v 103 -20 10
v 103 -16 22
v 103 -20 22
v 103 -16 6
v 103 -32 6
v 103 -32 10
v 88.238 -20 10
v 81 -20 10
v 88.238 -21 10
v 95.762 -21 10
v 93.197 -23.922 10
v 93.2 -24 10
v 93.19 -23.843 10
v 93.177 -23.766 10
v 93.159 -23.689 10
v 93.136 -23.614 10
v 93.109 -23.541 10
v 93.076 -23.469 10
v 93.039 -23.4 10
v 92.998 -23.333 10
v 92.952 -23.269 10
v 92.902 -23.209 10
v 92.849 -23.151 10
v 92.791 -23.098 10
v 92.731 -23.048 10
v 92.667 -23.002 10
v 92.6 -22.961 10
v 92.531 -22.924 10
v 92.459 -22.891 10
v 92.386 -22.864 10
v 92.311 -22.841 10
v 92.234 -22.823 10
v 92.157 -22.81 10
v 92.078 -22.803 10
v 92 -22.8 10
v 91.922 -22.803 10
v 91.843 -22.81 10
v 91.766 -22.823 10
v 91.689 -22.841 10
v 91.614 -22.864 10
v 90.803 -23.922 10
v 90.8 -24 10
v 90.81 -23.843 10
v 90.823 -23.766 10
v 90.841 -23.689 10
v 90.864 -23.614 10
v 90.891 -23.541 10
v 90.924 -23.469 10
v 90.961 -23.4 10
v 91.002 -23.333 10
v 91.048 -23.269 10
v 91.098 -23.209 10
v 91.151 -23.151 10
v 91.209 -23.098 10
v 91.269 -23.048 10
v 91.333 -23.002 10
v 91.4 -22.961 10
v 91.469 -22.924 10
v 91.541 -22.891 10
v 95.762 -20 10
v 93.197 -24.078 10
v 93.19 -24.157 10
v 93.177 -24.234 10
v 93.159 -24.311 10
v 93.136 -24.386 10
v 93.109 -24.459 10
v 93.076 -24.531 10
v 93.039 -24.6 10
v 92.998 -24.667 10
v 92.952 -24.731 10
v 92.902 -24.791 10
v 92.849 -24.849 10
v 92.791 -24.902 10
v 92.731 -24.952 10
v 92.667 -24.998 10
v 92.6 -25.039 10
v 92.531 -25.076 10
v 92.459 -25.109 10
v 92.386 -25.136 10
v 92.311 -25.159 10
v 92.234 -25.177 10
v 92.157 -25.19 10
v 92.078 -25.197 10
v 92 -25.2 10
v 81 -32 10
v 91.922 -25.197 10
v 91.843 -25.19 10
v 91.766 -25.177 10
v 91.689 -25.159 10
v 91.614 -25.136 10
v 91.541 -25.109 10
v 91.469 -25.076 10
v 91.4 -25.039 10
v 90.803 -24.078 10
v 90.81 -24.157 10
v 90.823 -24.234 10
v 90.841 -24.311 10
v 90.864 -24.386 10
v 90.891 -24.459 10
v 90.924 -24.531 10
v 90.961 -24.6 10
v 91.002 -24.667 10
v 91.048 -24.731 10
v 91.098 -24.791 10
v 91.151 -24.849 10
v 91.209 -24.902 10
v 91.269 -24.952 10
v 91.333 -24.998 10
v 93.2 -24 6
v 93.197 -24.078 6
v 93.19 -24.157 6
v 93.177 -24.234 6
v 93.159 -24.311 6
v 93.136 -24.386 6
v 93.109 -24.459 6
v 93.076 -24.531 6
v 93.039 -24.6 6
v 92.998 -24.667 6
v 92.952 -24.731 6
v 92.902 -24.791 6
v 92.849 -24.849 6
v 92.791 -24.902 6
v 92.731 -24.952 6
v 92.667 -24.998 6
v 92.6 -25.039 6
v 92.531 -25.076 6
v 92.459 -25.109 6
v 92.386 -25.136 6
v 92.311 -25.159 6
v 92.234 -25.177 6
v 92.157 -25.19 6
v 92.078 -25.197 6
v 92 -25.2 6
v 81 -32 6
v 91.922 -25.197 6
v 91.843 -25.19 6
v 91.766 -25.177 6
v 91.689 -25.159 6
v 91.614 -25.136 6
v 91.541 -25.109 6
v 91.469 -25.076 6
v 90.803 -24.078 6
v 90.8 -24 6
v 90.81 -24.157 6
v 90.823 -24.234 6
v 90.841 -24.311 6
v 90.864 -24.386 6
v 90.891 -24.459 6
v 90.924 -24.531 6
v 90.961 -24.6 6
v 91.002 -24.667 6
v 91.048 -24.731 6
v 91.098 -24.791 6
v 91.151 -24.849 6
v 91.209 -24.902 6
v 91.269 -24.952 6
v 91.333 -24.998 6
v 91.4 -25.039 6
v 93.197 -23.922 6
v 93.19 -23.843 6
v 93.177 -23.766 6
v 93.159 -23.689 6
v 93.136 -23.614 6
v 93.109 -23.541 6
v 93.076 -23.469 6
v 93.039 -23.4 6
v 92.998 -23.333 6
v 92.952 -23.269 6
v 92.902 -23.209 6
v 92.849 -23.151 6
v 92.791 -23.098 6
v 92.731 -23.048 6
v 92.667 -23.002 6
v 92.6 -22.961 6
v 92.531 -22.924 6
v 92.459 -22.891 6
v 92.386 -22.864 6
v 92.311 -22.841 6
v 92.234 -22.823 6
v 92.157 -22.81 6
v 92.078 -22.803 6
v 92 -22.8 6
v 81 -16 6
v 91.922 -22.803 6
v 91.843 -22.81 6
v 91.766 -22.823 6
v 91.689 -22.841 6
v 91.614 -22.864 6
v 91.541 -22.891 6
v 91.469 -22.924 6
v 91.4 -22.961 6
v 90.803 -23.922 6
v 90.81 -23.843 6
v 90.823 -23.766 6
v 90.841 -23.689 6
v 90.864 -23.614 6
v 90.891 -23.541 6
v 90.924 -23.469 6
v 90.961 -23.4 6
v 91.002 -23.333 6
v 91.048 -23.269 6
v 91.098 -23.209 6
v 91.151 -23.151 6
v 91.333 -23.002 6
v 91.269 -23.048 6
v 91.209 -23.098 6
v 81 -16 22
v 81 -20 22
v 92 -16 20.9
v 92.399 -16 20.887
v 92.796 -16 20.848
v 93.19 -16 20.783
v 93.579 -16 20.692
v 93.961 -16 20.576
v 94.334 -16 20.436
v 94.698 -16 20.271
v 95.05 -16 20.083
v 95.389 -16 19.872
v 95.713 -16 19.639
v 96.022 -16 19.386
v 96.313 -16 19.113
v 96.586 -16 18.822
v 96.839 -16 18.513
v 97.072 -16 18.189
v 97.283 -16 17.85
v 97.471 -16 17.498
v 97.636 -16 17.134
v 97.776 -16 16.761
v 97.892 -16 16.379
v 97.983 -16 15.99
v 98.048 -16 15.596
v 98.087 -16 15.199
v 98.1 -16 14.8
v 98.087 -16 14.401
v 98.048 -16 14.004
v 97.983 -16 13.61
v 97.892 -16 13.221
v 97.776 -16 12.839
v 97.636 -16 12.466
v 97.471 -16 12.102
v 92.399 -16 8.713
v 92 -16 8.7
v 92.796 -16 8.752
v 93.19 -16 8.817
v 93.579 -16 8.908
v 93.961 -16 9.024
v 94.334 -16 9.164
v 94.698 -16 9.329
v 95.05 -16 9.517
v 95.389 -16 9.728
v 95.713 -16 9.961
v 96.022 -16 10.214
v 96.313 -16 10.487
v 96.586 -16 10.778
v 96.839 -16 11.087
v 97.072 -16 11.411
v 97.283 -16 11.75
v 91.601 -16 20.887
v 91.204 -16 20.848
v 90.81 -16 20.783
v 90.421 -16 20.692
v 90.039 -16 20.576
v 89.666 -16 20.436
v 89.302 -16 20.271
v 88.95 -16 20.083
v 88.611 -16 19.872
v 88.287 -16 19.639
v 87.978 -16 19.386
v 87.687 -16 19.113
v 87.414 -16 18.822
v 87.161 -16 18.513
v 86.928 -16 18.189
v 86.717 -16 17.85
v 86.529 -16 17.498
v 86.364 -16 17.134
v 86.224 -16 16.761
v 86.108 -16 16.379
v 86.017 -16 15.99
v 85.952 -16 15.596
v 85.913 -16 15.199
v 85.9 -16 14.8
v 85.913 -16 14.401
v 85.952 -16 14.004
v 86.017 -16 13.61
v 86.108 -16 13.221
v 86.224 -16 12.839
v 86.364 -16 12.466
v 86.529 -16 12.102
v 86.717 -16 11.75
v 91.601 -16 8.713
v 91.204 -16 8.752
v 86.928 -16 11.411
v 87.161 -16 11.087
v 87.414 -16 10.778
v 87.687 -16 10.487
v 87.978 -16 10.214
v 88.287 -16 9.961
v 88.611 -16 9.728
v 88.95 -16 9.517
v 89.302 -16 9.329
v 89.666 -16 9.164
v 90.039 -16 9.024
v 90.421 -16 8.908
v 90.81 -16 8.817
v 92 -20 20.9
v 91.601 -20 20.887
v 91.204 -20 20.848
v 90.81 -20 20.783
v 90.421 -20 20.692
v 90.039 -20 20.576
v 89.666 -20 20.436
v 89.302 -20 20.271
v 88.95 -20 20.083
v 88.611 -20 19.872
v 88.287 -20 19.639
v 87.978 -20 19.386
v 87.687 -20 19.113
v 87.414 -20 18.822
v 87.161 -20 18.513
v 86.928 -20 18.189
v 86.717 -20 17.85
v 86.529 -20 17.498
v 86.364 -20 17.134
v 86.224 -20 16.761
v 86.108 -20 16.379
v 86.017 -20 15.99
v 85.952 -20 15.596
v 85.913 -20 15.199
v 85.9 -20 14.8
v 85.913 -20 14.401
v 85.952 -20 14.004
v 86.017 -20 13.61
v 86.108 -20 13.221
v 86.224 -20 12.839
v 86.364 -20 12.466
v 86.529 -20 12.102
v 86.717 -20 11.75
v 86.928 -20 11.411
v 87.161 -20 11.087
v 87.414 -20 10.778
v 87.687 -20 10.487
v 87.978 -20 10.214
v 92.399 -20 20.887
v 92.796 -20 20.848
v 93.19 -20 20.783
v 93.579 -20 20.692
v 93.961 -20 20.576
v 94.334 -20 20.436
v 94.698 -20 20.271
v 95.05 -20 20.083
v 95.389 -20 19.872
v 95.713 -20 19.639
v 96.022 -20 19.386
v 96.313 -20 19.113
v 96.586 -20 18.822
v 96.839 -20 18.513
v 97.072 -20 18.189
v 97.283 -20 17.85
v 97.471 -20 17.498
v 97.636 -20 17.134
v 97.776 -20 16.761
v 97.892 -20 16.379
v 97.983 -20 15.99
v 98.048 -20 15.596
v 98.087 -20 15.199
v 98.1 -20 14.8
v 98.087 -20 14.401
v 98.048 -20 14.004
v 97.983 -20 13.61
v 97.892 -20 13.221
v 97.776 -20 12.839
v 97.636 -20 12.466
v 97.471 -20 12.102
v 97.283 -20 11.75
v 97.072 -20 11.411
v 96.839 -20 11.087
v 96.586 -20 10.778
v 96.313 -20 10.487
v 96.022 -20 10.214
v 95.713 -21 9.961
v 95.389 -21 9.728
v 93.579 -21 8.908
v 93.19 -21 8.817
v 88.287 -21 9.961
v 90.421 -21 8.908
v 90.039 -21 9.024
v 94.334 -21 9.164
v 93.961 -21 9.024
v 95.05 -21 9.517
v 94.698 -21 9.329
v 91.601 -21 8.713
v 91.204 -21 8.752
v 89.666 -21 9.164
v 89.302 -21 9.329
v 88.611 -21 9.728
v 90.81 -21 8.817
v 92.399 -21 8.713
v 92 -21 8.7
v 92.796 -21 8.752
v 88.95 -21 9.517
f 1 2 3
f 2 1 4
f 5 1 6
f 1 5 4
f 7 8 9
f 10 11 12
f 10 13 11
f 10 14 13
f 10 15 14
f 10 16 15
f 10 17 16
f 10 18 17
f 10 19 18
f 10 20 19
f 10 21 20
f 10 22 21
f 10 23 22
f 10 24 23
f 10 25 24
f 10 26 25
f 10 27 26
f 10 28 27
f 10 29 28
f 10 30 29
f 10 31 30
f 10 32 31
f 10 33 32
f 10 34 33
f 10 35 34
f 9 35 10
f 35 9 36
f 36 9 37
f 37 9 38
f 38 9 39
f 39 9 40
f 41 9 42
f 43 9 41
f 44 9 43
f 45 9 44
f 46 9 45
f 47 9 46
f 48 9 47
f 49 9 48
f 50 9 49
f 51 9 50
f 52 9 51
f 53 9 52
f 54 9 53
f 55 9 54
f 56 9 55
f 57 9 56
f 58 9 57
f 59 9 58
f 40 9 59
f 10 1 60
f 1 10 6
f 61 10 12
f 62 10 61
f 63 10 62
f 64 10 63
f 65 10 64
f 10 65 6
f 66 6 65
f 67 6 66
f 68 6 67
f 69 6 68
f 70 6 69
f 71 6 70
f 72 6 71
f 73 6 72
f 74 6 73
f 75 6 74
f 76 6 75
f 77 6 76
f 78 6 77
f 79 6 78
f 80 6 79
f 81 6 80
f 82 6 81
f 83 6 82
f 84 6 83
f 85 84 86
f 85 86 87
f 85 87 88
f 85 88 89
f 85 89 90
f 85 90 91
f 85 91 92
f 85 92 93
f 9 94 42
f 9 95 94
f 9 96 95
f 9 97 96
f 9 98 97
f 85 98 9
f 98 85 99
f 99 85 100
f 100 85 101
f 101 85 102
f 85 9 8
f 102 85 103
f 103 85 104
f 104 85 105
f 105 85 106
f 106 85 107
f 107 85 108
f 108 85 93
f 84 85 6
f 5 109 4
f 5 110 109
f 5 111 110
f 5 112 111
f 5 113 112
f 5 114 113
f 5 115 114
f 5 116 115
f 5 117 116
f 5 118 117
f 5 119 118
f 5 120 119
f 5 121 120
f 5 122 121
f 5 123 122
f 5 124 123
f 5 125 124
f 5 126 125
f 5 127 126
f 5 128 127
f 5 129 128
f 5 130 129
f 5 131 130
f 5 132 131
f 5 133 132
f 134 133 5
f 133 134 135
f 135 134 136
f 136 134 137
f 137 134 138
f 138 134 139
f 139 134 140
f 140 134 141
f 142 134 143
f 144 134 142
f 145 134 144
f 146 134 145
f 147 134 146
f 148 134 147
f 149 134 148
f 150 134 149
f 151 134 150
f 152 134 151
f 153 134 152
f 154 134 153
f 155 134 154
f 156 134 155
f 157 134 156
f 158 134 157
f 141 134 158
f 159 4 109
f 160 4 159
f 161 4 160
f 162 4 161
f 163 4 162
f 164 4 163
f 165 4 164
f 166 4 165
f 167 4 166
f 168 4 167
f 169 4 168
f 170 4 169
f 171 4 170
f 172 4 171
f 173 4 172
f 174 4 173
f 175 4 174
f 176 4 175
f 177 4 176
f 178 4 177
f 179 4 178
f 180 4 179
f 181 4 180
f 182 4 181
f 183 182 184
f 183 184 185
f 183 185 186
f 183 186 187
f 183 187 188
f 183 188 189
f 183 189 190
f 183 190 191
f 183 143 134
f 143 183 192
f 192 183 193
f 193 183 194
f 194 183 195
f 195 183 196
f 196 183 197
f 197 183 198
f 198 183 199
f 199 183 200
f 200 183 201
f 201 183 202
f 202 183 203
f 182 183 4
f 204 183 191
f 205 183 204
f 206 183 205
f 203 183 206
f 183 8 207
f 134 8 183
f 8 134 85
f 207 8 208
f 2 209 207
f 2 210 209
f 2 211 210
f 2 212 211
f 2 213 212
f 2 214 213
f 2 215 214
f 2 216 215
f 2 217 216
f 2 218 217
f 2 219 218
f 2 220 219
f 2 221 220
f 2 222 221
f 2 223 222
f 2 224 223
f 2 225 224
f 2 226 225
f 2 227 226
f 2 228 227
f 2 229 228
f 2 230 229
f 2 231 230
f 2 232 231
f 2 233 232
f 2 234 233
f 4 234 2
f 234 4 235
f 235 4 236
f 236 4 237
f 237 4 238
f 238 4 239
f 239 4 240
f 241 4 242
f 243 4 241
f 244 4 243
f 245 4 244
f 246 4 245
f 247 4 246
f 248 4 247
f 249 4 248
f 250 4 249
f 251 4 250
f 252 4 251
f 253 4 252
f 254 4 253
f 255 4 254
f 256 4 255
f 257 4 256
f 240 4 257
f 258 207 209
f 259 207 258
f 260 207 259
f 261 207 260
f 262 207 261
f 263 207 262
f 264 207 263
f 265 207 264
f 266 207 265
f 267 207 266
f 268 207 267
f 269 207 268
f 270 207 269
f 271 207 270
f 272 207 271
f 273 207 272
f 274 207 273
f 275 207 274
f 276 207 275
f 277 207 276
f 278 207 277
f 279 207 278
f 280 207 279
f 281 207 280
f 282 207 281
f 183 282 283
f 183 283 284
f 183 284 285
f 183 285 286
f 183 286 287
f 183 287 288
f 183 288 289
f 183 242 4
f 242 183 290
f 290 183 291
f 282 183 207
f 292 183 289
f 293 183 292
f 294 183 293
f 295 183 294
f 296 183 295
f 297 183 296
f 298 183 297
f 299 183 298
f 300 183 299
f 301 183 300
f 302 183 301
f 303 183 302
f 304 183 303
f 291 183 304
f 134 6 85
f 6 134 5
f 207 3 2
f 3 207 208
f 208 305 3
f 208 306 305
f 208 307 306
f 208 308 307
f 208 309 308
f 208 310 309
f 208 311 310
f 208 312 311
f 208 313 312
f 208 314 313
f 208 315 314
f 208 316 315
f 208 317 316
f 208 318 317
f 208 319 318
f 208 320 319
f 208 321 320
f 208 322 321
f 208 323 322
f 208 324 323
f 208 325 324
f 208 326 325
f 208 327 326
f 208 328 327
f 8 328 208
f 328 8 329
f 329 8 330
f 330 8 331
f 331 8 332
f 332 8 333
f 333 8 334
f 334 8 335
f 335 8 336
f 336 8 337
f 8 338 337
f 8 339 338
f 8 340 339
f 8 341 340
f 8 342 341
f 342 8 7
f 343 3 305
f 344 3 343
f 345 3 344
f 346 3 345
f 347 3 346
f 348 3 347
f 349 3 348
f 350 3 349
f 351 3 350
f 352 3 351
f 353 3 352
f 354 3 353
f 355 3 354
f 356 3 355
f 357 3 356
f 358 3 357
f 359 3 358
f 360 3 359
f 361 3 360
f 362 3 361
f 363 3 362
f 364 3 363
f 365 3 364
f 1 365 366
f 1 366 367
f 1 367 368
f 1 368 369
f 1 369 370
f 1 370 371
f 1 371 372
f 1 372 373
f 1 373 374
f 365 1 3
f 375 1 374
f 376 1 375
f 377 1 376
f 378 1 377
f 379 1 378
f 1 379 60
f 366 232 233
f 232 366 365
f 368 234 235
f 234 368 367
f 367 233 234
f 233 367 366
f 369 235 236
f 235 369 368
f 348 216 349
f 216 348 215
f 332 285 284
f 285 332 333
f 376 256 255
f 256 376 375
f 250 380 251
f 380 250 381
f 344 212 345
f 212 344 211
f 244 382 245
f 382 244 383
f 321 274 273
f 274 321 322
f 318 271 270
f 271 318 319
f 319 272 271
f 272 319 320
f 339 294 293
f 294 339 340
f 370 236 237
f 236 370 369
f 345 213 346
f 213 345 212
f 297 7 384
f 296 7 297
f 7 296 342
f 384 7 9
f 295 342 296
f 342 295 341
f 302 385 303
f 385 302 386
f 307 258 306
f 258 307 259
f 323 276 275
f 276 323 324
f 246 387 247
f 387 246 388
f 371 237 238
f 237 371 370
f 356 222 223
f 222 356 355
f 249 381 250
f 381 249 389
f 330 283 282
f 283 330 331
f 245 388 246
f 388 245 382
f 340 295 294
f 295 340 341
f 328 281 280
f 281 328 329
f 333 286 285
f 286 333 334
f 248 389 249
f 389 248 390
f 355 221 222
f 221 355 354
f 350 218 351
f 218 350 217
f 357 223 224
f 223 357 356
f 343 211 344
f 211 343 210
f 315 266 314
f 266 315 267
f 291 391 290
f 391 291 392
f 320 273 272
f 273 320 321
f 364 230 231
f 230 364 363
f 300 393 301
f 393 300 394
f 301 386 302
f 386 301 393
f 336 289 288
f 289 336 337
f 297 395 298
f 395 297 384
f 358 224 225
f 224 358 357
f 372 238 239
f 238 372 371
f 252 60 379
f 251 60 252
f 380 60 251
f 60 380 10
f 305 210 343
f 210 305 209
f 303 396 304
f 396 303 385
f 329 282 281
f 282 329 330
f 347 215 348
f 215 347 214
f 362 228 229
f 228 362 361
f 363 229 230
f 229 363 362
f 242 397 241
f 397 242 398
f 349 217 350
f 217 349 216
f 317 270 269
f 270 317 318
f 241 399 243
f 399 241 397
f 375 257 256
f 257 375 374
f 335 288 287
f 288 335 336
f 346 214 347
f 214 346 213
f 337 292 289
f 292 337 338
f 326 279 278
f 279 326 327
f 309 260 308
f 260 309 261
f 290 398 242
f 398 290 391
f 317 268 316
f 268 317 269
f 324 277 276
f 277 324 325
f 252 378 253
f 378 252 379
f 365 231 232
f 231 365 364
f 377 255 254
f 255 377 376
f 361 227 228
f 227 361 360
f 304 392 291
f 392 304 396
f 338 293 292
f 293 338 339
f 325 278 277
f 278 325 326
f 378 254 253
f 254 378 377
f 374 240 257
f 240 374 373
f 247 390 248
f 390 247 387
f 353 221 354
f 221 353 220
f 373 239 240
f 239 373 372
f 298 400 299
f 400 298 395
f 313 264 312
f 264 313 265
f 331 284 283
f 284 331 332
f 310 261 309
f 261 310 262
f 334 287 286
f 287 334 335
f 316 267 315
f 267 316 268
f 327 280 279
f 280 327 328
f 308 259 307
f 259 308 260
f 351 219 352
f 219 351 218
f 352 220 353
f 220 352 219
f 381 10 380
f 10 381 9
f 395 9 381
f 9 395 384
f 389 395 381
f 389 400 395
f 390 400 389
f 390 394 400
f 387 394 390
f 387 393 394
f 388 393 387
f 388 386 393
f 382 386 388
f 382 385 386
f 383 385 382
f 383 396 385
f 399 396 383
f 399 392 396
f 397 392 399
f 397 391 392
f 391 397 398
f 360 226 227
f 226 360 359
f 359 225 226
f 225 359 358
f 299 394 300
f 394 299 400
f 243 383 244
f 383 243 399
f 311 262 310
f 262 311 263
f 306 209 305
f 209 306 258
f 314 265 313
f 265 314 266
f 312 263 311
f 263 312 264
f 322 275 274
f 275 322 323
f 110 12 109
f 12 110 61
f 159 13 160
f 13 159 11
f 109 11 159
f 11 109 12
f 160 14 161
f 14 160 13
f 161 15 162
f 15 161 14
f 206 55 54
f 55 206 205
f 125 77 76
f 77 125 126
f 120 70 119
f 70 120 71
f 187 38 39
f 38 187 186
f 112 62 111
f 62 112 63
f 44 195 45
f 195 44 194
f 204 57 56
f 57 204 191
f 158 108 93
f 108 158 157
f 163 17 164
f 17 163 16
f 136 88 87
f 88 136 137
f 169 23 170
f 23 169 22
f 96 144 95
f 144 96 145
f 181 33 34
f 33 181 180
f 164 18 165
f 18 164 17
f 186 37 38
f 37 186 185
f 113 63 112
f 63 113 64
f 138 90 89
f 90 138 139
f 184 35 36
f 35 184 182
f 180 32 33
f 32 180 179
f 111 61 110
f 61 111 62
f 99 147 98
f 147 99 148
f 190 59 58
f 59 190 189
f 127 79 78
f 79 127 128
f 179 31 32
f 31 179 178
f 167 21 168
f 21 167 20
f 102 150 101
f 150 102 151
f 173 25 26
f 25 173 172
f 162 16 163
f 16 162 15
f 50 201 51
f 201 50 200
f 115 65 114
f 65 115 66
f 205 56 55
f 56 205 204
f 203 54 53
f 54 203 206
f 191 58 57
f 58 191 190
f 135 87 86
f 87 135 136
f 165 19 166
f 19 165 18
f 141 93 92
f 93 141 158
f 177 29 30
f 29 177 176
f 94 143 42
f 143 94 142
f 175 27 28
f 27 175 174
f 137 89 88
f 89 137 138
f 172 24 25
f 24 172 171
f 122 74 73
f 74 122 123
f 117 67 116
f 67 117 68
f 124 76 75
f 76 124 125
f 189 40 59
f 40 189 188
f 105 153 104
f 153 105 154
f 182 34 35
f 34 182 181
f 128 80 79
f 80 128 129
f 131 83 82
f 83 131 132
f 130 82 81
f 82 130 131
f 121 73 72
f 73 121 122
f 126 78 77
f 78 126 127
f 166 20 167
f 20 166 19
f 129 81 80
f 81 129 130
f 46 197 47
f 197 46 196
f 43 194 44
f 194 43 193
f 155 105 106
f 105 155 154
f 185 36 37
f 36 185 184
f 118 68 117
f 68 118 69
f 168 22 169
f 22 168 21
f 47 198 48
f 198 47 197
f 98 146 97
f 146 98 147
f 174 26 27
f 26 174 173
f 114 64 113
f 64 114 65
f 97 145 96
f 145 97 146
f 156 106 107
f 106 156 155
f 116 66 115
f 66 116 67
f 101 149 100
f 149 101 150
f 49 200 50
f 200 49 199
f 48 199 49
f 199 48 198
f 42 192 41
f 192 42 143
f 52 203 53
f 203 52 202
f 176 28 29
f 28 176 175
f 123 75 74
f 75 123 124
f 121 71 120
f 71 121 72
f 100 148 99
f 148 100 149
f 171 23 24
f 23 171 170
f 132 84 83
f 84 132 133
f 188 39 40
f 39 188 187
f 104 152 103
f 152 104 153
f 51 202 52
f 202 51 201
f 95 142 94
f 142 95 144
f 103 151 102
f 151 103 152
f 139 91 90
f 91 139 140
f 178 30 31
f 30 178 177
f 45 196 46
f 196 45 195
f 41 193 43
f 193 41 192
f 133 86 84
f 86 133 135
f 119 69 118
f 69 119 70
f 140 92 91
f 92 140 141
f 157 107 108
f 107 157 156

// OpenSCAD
// file: params.scad
// =====================================================================
//  PAO 发射器机械件 —— 全局参数
//  所有零件共用本文件，改这里即整体联动
//
//  坐标系：
//    X = 发射方向（0 = 尾端，base_x = 前端枪口）
//    Y = 横向（0 = 弹道中心线）
//    Z = 垂直（0 = 桌面，底板占 0..base_t）
//
//  工作原理（决定了下述拓扑）：
//    电机轴沿 Y 横穿；摩擦轮装在轴上、悬在弹道正上方。
//    弹丸靠重力从喉部落到轮下，被轮缘压住甩向 +X。
//    单轮从上方压弹 → 弹仓必须与轮共位，喉部即弹仓。
// =====================================================================

$fn = 96;

/* ================= 底板 ================= */
base_x    = 100;    // 底板长
base_y    = 65;     // 底板宽
base_t    = 6;      // 底板厚
corner_r  = 3;      // 底板圆角

/* ================= 弹道通道 ================= */
rail_gap  = 13;     // 通道净宽（issue #61 图上标注）
bar_wall  = 2.4;    // 筒壁厚
bar_x0    = 2;      // 筒/喉部起点 X
bar_x1    = 98;     // 筒终点 X（前端枪口）
throat_x1 = 38;     // 喉部终点 X（此后加盖成封闭弹道）
wall_top  = 22;     // 侧壁高（底板顶面以上）
throat_h  = 64;     // 喉部总高（须在轮顶之上留出储弹空间，至少 2 发）
bar_top_h = 4;      // 顶盖厚

/* ================= 弹丸 ================= */
ball_d    = 11;     // 纸团压实后直径

/* ================= 摩擦轮 ================= */
fw_r      = 12;     // 轮半径
fw_t      = 8;      // 轮宽
fw_x      = 24;     // 轮轴 X
shaft_d   = 4;      // 钢轴直径
fw_squeeze = 1;     // 轮缘压入弹丸的量
fw_zc     = base_t + ball_d - fw_squeeze + fw_r;   // 轴心高度（推导 = 28）

/* ================= 驱动组 ================= */
motor_d   = 24.4;   // 电机外径（130 型）
motor_clamp_l = 18; // 夹持长度
br_wall   = 6;      // 支架立板厚
br_y      = rail_gap / 2 + bar_wall + 2;   // 立板起始 Y（= 10.9）

/* ================= 弹仓 ================= */
mag_len   = throat_x1 - bar_x0 - bar_wall;  // 喉部可用储弹长
mag_d     = rail_gap;                        // 储弹腔内径 ≡ 通道宽

/* ================= 按钮座 ================= */
sw_d      = 12.2;   // 点触开关安装孔
sw_mount_x = 92;
sw_mount_y = -24;

/* ================= 送弹斜坡 ================= */
ramp_x0   = 4;      // 斜坡起点 X
ramp_x1   = 20;     // 斜坡终点 X（落入摩擦轮咬入区）
ramp_h    = 10;     // 斜坡起端高出底板顶面的量

/* ================= 紧固件 ================= */
screw_d   = 2.4;    // 自攻螺钉过孔
// file: parts.scad
// =====================================================================
//  PAO 发射器 —— 全部零件模块库
//  include <params.scad> 后调用下列 module；本文件自身不产生几何体
// =====================================================================

include <params.scad>

/* ---------------------------------------------------------------
   通用：圆角矩形板
   --------------------------------------------------------------- */
module rrect_plate(x0, y0, x1, y1, z0, z1, r) {
    hull()
        for (x = [x0 + r, x1 - r])
            for (y = [y0 + r, y1 - r])
                translate([x, y, z0]) cylinder(r = r, h = z1 - z0);
}

/* ---------------------------------------------------------------
   送弹斜坡：靠重力把弹丸送进轮下咬入区
   --------------------------------------------------------------- */
module feed_ramp() {
    hull() {
        translate([ramp_x0, -rail_gap / 2, base_t])
            cube([0.1, rail_gap, ramp_h]);
        translate([ramp_x1, -rail_gap / 2, base_t])
            cube([0.1, rail_gap, 0.1]);
    }
}

/* ===============================================================
   1. 底板 base-plate
   =============================================================== */
module base_plate() {
    difference() {
        union() {
            rrect_plate(0, -base_y / 2, base_x, base_y / 2, 0, base_t, corner_r);
            feed_ramp();
        }

        // 四角安装孔
        for (x = [10, base_x - 12])
            for (y = [-base_y / 2 + 10, base_y / 2 - 10])
                translate([x, y, -1]) cylinder(d = screw_d, h = base_t + 2);

        // 弹道筒固定孔（落在筒壁正下方）
        for (x = [16, 90])
            for (s = [-1, 1])
                translate([x, s * (rail_gap / 2 + bar_wall / 2), -1])
                    cylinder(d = screw_d, h = base_t + 2);

        // 驱动支架固定孔
        for (x = [fw_x - 10, fw_x + 10])
            translate([x, br_y + 14, -1]) cylinder(d = screw_d, h = base_t + 2);

        // 按钮座固定孔
        translate([sw_mount_x, sw_mount_y, -1]) cylinder(d = screw_d, h = base_t + 2);

        // 底面减重槽
        for (x = [42, 64, 84])
            translate([x, 0, 1.5]) hull() {
                translate([-6, -15, 0]) cylinder(r = 3, h = base_t);
                translate([6, -15, 0]) cylinder(r = 3, h = base_t);
                translate([-6, 15, 0]) cylinder(r = 3, h = base_t);
                translate([6, 15, 0]) cylinder(r = 3, h = base_t);
            }
    }
}

/* ===============================================================
   2. 弹道筒 + 弹仓喉部 barrel
   · 侧壁贯穿全长
   · 后段（bar_x0..throat_x1）加高成喉部，即弹仓
   · 前段（throat_x1..bar_x1）加盖成封闭弹道
   · 侧壁开轴孔让轮轴穿过
   =============================================================== */
module barrel() {
    z0 = base_t;

    module walls() {
        for (s = [-1, 1]) {
            y = s > 0 ? rail_gap / 2 : -rail_gap / 2 - bar_wall;
            // 基本侧壁（全长）
            translate([bar_x0, y, z0])
                cube([bar_x1 - bar_x0, bar_wall, wall_top]);
            // 喉部加高段
            translate([bar_x0, y, z0])
                cube([throat_x1 - bar_x0, bar_wall, throat_h]);
        }
        // 后端封板
        translate([bar_x0, -rail_gap / 2 - bar_wall, z0])
            cube([bar_wall, rail_gap + 2 * bar_wall, throat_h]);
    }

    module front_lid() {
        translate([throat_x1, -rail_gap / 2 - bar_wall, z0 + wall_top])
            cube([bar_x1 - throat_x1, rail_gap + 2 * bar_wall, bar_top_h]);
    }

    difference() {
        union() {
            walls();
            front_lid();
        }
        // 轴过孔（贯穿两侧壁）
        for (s = [-1, 1])
            translate([fw_x, s * (rail_gap / 2 + bar_wall + 1), fw_zc])
                rotate([90, 0, 0])
                    cylinder(d = shaft_d + 0.5, h = 2 * (bar_wall + 1));
    }
}

/* ===============================================================
   3. 摩擦轮 flywheel
   =============================================================== */
module flywheel() {
    difference() {
        union() {
            cylinder(r = fw_r, h = fw_t, center = true);
            cylinder(r = fw_r * 0.38, h = fw_t + 4, center = true);
        }
        cylinder(d = shaft_d + 0.15, h = fw_t + 6, center = true);
        // 轮缘环槽
        rotate_extrude(convexity = 4)
            translate([fw_r - 0.5, 0, 0]) circle(d = 1.6);
        // 减重孔
        for (a = [0 : 60 : 359])
            rotate([0, 0, a]) translate([fw_r * 0.68, 0, 0])
                cylinder(d = fw_r * 0.3, h = fw_t + 6, center = true);
    }
}

/* ===============================================================
   4. 驱动支架 drive-bracket
   立板 + 电机夹持筒 + 底板脚
   =============================================================== */
module drive_bracket() {
    difference() {
        union() {
            // 底板脚
            translate([fw_x - 16, br_y, base_t])
                cube([34, 20, 5]);
            // 立板
            translate([fw_x - 16, br_y, base_t])
                cube([34, br_wall, fw_zc + fw_r - base_t]);
            // 电机夹持筒
            translate([fw_x, br_y + br_wall, fw_zc])
                rotate([-90, 0, 0])
                    cylinder(d = motor_d + 6, h = motor_clamp_l);
        }
        // 轴过孔
        translate([fw_x, br_y - 1, fw_zc])
            rotate([-90, 0, 0])
                cylinder(d = shaft_d + 0.4, h = br_wall + 2);
        // 电机腔
        translate([fw_x, br_y + br_wall - 0.5, fw_zc])
            rotate([-90, 0, 0])
                cylinder(d = motor_d + 0.4, h = motor_clamp_l - 1);
        // 夹紧缝
        translate([fw_x, br_y + br_wall + motor_clamp_l / 2, fw_zc + motor_d / 2])
            cube([1.6, motor_clamp_l, 8], center = true);
        // 脚部螺钉孔
        for (x = [fw_x - 10, fw_x + 10])
            translate([x, br_y + 14, base_t - 1])
                cylinder(d = screw_d, h = 8);
    }
}

/* ===============================================================
   5. 按钮座 button-mount
   =============================================================== */
module button_mount() {
    w = 22; d = 16; t = 4; wall_h = 16;

    difference() {
        union() {
            translate([sw_mount_x - w / 2, sw_mount_y - d / 2, base_t])
                cube([w, d, t]);
            translate([sw_mount_x - w / 2, sw_mount_y + d / 2 - t, base_t])
                cube([w, t, wall_h]);
        }
        // 开关孔（轴向 Y）
        translate([sw_mount_x, sw_mount_y + d / 2 - t - 1, base_t + wall_h * 0.55])
            rotate([-90, 0, 0])
                cylinder(d = sw_d, h = t + 2);
        // 底板固定孔
        translate([sw_mount_x, sw_mount_y, base_t - 1])
            cylinder(d = screw_d, h = t + 2);
    }
}
// main file
// 按钮座 —— 独立渲染入口

include <parts.scad>

button_mount();
